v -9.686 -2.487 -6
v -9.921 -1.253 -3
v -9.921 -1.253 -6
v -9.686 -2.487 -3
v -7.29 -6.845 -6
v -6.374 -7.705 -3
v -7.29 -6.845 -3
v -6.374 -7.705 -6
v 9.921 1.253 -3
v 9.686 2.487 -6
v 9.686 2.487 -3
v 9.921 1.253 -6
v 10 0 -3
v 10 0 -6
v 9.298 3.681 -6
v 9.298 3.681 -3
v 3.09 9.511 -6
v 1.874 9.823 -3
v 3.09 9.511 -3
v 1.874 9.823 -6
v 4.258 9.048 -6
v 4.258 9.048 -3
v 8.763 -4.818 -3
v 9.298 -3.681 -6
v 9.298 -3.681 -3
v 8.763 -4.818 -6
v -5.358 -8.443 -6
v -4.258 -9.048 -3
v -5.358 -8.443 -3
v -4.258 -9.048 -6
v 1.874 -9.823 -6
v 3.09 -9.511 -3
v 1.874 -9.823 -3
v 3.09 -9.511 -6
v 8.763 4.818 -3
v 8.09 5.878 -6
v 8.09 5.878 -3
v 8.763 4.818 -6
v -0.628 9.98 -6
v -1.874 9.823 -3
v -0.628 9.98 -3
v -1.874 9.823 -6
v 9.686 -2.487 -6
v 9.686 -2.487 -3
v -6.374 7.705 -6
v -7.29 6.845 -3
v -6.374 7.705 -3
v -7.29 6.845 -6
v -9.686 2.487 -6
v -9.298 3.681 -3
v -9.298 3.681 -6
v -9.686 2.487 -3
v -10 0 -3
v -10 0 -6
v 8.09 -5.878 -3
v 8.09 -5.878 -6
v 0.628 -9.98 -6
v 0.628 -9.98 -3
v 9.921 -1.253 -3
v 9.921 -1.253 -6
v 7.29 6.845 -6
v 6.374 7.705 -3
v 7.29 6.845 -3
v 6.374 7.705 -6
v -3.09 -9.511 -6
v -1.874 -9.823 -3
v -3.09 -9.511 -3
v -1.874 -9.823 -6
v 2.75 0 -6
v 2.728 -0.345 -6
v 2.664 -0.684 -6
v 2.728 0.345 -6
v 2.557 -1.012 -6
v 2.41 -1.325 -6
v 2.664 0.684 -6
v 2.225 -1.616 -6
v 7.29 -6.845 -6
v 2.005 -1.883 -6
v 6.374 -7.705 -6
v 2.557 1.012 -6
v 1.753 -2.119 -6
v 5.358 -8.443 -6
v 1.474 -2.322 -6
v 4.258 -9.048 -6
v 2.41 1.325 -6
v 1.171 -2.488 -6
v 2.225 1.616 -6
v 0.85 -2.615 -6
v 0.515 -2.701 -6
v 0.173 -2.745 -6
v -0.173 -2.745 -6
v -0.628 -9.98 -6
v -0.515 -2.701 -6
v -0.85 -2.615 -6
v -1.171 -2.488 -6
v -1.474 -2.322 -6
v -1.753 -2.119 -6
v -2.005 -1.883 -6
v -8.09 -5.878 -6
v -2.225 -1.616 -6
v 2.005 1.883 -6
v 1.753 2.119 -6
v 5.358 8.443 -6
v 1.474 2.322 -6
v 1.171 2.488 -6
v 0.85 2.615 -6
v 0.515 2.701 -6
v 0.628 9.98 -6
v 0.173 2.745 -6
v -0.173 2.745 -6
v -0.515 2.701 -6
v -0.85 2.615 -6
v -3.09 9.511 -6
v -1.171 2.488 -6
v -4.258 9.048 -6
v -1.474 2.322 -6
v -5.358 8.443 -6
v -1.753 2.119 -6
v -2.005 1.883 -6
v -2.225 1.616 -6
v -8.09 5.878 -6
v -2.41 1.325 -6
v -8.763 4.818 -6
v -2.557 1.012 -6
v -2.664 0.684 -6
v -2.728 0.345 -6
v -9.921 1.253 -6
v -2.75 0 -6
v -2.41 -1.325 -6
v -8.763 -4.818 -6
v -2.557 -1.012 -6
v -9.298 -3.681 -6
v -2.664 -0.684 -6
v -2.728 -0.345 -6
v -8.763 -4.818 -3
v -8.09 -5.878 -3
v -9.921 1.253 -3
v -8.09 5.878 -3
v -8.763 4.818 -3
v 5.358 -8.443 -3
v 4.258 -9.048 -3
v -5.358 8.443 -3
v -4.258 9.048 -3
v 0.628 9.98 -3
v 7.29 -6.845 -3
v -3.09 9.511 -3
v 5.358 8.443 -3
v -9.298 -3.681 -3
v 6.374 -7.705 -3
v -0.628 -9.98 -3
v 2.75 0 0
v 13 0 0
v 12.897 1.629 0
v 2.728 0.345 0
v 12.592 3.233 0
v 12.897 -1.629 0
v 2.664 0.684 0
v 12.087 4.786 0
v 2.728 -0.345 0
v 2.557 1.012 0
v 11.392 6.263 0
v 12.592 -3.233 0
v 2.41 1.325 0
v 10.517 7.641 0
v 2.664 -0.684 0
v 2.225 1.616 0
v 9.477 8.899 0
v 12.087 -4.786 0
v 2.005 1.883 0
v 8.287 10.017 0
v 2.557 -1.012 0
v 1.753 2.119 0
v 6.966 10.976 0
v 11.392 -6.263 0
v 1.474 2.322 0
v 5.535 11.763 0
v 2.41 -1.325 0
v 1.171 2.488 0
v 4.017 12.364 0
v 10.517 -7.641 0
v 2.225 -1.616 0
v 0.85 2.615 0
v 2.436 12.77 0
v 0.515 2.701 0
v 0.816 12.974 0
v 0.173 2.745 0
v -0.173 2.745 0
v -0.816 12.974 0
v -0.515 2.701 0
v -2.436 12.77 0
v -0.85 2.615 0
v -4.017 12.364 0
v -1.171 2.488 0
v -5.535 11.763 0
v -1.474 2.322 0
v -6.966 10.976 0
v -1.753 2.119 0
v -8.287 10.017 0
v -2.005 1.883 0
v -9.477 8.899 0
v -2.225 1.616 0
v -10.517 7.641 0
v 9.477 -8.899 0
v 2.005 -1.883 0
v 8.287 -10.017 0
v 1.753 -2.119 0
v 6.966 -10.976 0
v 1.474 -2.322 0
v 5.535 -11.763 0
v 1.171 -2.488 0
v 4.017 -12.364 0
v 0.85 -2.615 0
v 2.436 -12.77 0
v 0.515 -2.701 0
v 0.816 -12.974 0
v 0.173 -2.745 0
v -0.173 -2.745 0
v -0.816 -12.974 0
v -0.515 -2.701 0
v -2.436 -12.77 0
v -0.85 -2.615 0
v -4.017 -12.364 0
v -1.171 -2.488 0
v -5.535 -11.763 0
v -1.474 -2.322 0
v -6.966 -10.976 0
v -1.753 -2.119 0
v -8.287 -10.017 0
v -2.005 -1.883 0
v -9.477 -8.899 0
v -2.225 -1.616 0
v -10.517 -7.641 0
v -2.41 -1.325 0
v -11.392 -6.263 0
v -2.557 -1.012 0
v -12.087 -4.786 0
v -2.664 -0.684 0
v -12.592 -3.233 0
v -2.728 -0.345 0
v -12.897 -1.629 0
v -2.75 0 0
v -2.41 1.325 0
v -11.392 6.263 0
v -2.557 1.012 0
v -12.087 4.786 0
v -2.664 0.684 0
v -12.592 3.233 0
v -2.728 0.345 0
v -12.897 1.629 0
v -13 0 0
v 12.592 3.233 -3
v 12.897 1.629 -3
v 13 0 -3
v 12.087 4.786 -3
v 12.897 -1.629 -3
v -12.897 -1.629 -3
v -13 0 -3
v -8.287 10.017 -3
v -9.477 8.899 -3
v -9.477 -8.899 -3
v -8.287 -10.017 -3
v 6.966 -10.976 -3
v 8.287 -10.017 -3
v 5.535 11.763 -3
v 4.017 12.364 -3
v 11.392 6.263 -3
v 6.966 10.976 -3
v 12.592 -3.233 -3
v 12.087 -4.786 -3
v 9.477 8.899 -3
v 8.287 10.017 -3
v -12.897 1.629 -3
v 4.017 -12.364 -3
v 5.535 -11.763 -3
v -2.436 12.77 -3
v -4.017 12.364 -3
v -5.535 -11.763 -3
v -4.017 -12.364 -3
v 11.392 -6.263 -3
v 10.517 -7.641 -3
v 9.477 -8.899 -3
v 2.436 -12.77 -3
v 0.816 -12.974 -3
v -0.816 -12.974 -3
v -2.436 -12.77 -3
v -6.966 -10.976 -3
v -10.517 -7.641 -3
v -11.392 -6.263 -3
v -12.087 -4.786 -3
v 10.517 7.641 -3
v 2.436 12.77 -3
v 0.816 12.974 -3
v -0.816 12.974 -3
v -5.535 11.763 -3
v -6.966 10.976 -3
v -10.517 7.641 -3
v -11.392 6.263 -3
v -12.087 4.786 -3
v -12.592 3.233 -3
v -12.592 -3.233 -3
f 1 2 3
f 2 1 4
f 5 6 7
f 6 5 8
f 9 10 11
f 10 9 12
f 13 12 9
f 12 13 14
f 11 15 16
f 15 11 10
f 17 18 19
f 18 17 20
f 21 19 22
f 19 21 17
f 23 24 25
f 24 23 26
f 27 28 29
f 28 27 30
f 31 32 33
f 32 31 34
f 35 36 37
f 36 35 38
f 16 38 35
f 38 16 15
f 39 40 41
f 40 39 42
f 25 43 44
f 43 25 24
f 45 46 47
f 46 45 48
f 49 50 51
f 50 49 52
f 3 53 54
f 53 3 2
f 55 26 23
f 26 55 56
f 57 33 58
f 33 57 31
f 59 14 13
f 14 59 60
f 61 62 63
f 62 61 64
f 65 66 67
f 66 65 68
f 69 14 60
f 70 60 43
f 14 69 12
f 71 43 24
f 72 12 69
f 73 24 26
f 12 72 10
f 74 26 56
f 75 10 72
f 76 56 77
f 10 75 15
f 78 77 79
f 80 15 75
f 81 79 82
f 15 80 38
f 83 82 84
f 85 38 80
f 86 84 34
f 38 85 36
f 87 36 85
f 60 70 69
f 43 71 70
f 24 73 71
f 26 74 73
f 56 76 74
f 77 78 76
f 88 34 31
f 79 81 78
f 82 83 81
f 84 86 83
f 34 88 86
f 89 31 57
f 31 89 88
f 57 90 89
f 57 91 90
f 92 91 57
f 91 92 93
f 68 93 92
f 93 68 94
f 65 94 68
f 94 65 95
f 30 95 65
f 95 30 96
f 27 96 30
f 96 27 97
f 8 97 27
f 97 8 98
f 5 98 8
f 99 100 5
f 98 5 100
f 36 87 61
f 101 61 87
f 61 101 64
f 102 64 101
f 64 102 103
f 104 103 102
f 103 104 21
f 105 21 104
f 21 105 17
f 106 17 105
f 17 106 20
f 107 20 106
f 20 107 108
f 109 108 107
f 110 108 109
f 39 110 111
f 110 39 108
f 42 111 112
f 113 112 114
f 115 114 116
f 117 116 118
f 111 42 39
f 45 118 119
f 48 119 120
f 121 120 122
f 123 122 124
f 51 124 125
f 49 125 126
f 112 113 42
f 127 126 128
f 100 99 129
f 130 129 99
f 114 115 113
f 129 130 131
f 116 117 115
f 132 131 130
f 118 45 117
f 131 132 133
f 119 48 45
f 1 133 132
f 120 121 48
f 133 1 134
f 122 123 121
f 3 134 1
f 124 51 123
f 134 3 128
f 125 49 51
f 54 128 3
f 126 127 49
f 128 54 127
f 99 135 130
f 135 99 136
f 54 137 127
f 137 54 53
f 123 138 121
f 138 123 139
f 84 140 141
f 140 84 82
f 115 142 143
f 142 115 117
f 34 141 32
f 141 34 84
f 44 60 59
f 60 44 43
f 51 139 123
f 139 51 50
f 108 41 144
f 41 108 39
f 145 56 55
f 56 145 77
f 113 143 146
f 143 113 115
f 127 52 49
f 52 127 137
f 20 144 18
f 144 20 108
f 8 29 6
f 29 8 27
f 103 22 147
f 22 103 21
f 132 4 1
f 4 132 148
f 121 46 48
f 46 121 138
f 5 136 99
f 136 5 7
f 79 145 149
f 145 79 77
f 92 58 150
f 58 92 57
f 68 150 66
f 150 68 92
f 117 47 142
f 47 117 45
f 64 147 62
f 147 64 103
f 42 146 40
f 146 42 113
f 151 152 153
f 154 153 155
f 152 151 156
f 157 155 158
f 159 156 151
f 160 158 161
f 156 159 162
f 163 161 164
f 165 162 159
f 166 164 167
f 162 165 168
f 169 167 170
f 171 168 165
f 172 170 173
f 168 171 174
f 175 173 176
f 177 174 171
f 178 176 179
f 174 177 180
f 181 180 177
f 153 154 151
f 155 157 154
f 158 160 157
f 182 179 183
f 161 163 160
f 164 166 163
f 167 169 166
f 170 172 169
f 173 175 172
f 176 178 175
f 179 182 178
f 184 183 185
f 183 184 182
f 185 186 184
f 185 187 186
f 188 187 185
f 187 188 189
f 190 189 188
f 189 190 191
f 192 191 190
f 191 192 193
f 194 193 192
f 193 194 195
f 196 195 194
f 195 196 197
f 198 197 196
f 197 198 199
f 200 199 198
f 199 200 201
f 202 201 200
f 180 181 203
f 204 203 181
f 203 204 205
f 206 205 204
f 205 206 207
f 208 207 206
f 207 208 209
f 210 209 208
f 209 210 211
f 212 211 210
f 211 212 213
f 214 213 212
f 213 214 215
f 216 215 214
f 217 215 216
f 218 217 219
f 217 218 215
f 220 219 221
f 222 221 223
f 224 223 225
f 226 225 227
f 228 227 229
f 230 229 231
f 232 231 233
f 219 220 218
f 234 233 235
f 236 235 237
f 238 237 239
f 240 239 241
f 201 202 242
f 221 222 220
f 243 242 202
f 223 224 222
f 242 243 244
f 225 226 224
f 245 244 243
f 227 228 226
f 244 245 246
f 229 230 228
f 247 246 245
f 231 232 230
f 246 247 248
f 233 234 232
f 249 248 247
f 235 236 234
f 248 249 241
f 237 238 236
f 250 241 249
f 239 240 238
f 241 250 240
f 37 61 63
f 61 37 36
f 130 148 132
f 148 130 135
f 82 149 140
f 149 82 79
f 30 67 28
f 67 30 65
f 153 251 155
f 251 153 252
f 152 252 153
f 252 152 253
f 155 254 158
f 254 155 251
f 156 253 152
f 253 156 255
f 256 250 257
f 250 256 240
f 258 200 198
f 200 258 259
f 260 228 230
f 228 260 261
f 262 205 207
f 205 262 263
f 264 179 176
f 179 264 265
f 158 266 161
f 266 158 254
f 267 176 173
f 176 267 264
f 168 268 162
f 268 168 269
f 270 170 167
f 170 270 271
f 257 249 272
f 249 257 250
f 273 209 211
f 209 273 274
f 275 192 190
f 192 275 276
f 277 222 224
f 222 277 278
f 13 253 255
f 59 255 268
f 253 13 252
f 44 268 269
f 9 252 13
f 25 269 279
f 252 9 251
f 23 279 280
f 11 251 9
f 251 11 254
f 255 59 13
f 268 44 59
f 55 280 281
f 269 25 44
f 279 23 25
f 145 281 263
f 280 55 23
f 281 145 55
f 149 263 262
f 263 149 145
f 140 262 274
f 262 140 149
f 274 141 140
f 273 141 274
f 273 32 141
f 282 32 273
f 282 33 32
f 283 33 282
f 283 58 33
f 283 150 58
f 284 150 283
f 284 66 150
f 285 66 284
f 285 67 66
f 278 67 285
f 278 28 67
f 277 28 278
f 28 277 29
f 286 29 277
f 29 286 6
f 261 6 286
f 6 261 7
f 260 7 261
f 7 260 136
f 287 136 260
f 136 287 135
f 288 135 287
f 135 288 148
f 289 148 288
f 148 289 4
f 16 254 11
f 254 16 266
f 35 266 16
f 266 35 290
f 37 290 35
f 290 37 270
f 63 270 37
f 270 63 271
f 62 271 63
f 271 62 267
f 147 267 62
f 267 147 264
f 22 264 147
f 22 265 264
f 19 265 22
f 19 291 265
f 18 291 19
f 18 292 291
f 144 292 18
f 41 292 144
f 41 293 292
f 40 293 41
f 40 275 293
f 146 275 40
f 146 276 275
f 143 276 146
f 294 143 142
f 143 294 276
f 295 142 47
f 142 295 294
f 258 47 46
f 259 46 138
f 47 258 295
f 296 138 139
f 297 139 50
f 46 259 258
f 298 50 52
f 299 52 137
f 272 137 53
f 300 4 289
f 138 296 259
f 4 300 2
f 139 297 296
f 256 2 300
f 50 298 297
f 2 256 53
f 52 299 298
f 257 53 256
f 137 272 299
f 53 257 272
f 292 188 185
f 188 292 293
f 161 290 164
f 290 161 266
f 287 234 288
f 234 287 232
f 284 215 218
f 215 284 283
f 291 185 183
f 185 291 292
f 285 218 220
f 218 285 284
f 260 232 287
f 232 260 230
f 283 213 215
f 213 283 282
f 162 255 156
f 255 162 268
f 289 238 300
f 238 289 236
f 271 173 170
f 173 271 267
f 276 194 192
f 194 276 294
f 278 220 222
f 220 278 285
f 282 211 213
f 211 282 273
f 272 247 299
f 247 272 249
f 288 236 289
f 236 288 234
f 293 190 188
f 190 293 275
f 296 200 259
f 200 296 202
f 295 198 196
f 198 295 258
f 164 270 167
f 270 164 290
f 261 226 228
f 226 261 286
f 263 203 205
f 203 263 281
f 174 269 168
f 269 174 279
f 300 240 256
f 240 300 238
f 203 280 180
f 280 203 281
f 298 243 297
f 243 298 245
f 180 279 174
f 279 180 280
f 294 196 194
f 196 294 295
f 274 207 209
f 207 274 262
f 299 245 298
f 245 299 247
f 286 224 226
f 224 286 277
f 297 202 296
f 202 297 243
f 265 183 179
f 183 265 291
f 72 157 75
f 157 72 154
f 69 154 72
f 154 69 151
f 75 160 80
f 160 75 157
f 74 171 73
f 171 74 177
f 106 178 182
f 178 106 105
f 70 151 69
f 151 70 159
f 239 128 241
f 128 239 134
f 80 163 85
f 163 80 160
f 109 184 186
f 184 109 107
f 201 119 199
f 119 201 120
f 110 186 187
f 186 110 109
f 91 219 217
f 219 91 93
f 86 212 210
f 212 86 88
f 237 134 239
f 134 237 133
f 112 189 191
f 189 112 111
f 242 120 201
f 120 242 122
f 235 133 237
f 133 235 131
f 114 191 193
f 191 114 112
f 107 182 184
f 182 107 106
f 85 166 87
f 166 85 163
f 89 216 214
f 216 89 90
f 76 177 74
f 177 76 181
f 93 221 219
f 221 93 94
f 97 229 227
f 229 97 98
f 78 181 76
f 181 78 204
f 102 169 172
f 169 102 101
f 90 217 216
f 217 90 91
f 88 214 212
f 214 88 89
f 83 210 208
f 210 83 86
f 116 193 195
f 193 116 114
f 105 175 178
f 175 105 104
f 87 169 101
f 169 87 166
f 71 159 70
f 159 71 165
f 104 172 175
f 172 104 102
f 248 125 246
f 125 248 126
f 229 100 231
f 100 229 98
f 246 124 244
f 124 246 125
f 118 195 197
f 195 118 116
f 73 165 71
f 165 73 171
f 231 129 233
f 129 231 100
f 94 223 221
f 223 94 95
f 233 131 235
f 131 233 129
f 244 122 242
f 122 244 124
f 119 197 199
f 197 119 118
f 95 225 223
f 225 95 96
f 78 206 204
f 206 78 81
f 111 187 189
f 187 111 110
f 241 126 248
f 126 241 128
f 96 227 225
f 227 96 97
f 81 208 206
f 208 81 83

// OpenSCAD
$fn = 50;


difference() {
	union() {
		translate(v = [0, 0, -6.0000000000]) {
			cylinder(h = 6, r = 10.0000000000);
		}
		translate(v = [0, 0, -3.0000000000]) {
			cylinder(h = 3, r = 13.0000000000);
		}
	}
	union() {
		#translate(v = [0, 0, -6]) {
			cylinder(h = 6, r = 2.7500000000);
		}
	}
}
